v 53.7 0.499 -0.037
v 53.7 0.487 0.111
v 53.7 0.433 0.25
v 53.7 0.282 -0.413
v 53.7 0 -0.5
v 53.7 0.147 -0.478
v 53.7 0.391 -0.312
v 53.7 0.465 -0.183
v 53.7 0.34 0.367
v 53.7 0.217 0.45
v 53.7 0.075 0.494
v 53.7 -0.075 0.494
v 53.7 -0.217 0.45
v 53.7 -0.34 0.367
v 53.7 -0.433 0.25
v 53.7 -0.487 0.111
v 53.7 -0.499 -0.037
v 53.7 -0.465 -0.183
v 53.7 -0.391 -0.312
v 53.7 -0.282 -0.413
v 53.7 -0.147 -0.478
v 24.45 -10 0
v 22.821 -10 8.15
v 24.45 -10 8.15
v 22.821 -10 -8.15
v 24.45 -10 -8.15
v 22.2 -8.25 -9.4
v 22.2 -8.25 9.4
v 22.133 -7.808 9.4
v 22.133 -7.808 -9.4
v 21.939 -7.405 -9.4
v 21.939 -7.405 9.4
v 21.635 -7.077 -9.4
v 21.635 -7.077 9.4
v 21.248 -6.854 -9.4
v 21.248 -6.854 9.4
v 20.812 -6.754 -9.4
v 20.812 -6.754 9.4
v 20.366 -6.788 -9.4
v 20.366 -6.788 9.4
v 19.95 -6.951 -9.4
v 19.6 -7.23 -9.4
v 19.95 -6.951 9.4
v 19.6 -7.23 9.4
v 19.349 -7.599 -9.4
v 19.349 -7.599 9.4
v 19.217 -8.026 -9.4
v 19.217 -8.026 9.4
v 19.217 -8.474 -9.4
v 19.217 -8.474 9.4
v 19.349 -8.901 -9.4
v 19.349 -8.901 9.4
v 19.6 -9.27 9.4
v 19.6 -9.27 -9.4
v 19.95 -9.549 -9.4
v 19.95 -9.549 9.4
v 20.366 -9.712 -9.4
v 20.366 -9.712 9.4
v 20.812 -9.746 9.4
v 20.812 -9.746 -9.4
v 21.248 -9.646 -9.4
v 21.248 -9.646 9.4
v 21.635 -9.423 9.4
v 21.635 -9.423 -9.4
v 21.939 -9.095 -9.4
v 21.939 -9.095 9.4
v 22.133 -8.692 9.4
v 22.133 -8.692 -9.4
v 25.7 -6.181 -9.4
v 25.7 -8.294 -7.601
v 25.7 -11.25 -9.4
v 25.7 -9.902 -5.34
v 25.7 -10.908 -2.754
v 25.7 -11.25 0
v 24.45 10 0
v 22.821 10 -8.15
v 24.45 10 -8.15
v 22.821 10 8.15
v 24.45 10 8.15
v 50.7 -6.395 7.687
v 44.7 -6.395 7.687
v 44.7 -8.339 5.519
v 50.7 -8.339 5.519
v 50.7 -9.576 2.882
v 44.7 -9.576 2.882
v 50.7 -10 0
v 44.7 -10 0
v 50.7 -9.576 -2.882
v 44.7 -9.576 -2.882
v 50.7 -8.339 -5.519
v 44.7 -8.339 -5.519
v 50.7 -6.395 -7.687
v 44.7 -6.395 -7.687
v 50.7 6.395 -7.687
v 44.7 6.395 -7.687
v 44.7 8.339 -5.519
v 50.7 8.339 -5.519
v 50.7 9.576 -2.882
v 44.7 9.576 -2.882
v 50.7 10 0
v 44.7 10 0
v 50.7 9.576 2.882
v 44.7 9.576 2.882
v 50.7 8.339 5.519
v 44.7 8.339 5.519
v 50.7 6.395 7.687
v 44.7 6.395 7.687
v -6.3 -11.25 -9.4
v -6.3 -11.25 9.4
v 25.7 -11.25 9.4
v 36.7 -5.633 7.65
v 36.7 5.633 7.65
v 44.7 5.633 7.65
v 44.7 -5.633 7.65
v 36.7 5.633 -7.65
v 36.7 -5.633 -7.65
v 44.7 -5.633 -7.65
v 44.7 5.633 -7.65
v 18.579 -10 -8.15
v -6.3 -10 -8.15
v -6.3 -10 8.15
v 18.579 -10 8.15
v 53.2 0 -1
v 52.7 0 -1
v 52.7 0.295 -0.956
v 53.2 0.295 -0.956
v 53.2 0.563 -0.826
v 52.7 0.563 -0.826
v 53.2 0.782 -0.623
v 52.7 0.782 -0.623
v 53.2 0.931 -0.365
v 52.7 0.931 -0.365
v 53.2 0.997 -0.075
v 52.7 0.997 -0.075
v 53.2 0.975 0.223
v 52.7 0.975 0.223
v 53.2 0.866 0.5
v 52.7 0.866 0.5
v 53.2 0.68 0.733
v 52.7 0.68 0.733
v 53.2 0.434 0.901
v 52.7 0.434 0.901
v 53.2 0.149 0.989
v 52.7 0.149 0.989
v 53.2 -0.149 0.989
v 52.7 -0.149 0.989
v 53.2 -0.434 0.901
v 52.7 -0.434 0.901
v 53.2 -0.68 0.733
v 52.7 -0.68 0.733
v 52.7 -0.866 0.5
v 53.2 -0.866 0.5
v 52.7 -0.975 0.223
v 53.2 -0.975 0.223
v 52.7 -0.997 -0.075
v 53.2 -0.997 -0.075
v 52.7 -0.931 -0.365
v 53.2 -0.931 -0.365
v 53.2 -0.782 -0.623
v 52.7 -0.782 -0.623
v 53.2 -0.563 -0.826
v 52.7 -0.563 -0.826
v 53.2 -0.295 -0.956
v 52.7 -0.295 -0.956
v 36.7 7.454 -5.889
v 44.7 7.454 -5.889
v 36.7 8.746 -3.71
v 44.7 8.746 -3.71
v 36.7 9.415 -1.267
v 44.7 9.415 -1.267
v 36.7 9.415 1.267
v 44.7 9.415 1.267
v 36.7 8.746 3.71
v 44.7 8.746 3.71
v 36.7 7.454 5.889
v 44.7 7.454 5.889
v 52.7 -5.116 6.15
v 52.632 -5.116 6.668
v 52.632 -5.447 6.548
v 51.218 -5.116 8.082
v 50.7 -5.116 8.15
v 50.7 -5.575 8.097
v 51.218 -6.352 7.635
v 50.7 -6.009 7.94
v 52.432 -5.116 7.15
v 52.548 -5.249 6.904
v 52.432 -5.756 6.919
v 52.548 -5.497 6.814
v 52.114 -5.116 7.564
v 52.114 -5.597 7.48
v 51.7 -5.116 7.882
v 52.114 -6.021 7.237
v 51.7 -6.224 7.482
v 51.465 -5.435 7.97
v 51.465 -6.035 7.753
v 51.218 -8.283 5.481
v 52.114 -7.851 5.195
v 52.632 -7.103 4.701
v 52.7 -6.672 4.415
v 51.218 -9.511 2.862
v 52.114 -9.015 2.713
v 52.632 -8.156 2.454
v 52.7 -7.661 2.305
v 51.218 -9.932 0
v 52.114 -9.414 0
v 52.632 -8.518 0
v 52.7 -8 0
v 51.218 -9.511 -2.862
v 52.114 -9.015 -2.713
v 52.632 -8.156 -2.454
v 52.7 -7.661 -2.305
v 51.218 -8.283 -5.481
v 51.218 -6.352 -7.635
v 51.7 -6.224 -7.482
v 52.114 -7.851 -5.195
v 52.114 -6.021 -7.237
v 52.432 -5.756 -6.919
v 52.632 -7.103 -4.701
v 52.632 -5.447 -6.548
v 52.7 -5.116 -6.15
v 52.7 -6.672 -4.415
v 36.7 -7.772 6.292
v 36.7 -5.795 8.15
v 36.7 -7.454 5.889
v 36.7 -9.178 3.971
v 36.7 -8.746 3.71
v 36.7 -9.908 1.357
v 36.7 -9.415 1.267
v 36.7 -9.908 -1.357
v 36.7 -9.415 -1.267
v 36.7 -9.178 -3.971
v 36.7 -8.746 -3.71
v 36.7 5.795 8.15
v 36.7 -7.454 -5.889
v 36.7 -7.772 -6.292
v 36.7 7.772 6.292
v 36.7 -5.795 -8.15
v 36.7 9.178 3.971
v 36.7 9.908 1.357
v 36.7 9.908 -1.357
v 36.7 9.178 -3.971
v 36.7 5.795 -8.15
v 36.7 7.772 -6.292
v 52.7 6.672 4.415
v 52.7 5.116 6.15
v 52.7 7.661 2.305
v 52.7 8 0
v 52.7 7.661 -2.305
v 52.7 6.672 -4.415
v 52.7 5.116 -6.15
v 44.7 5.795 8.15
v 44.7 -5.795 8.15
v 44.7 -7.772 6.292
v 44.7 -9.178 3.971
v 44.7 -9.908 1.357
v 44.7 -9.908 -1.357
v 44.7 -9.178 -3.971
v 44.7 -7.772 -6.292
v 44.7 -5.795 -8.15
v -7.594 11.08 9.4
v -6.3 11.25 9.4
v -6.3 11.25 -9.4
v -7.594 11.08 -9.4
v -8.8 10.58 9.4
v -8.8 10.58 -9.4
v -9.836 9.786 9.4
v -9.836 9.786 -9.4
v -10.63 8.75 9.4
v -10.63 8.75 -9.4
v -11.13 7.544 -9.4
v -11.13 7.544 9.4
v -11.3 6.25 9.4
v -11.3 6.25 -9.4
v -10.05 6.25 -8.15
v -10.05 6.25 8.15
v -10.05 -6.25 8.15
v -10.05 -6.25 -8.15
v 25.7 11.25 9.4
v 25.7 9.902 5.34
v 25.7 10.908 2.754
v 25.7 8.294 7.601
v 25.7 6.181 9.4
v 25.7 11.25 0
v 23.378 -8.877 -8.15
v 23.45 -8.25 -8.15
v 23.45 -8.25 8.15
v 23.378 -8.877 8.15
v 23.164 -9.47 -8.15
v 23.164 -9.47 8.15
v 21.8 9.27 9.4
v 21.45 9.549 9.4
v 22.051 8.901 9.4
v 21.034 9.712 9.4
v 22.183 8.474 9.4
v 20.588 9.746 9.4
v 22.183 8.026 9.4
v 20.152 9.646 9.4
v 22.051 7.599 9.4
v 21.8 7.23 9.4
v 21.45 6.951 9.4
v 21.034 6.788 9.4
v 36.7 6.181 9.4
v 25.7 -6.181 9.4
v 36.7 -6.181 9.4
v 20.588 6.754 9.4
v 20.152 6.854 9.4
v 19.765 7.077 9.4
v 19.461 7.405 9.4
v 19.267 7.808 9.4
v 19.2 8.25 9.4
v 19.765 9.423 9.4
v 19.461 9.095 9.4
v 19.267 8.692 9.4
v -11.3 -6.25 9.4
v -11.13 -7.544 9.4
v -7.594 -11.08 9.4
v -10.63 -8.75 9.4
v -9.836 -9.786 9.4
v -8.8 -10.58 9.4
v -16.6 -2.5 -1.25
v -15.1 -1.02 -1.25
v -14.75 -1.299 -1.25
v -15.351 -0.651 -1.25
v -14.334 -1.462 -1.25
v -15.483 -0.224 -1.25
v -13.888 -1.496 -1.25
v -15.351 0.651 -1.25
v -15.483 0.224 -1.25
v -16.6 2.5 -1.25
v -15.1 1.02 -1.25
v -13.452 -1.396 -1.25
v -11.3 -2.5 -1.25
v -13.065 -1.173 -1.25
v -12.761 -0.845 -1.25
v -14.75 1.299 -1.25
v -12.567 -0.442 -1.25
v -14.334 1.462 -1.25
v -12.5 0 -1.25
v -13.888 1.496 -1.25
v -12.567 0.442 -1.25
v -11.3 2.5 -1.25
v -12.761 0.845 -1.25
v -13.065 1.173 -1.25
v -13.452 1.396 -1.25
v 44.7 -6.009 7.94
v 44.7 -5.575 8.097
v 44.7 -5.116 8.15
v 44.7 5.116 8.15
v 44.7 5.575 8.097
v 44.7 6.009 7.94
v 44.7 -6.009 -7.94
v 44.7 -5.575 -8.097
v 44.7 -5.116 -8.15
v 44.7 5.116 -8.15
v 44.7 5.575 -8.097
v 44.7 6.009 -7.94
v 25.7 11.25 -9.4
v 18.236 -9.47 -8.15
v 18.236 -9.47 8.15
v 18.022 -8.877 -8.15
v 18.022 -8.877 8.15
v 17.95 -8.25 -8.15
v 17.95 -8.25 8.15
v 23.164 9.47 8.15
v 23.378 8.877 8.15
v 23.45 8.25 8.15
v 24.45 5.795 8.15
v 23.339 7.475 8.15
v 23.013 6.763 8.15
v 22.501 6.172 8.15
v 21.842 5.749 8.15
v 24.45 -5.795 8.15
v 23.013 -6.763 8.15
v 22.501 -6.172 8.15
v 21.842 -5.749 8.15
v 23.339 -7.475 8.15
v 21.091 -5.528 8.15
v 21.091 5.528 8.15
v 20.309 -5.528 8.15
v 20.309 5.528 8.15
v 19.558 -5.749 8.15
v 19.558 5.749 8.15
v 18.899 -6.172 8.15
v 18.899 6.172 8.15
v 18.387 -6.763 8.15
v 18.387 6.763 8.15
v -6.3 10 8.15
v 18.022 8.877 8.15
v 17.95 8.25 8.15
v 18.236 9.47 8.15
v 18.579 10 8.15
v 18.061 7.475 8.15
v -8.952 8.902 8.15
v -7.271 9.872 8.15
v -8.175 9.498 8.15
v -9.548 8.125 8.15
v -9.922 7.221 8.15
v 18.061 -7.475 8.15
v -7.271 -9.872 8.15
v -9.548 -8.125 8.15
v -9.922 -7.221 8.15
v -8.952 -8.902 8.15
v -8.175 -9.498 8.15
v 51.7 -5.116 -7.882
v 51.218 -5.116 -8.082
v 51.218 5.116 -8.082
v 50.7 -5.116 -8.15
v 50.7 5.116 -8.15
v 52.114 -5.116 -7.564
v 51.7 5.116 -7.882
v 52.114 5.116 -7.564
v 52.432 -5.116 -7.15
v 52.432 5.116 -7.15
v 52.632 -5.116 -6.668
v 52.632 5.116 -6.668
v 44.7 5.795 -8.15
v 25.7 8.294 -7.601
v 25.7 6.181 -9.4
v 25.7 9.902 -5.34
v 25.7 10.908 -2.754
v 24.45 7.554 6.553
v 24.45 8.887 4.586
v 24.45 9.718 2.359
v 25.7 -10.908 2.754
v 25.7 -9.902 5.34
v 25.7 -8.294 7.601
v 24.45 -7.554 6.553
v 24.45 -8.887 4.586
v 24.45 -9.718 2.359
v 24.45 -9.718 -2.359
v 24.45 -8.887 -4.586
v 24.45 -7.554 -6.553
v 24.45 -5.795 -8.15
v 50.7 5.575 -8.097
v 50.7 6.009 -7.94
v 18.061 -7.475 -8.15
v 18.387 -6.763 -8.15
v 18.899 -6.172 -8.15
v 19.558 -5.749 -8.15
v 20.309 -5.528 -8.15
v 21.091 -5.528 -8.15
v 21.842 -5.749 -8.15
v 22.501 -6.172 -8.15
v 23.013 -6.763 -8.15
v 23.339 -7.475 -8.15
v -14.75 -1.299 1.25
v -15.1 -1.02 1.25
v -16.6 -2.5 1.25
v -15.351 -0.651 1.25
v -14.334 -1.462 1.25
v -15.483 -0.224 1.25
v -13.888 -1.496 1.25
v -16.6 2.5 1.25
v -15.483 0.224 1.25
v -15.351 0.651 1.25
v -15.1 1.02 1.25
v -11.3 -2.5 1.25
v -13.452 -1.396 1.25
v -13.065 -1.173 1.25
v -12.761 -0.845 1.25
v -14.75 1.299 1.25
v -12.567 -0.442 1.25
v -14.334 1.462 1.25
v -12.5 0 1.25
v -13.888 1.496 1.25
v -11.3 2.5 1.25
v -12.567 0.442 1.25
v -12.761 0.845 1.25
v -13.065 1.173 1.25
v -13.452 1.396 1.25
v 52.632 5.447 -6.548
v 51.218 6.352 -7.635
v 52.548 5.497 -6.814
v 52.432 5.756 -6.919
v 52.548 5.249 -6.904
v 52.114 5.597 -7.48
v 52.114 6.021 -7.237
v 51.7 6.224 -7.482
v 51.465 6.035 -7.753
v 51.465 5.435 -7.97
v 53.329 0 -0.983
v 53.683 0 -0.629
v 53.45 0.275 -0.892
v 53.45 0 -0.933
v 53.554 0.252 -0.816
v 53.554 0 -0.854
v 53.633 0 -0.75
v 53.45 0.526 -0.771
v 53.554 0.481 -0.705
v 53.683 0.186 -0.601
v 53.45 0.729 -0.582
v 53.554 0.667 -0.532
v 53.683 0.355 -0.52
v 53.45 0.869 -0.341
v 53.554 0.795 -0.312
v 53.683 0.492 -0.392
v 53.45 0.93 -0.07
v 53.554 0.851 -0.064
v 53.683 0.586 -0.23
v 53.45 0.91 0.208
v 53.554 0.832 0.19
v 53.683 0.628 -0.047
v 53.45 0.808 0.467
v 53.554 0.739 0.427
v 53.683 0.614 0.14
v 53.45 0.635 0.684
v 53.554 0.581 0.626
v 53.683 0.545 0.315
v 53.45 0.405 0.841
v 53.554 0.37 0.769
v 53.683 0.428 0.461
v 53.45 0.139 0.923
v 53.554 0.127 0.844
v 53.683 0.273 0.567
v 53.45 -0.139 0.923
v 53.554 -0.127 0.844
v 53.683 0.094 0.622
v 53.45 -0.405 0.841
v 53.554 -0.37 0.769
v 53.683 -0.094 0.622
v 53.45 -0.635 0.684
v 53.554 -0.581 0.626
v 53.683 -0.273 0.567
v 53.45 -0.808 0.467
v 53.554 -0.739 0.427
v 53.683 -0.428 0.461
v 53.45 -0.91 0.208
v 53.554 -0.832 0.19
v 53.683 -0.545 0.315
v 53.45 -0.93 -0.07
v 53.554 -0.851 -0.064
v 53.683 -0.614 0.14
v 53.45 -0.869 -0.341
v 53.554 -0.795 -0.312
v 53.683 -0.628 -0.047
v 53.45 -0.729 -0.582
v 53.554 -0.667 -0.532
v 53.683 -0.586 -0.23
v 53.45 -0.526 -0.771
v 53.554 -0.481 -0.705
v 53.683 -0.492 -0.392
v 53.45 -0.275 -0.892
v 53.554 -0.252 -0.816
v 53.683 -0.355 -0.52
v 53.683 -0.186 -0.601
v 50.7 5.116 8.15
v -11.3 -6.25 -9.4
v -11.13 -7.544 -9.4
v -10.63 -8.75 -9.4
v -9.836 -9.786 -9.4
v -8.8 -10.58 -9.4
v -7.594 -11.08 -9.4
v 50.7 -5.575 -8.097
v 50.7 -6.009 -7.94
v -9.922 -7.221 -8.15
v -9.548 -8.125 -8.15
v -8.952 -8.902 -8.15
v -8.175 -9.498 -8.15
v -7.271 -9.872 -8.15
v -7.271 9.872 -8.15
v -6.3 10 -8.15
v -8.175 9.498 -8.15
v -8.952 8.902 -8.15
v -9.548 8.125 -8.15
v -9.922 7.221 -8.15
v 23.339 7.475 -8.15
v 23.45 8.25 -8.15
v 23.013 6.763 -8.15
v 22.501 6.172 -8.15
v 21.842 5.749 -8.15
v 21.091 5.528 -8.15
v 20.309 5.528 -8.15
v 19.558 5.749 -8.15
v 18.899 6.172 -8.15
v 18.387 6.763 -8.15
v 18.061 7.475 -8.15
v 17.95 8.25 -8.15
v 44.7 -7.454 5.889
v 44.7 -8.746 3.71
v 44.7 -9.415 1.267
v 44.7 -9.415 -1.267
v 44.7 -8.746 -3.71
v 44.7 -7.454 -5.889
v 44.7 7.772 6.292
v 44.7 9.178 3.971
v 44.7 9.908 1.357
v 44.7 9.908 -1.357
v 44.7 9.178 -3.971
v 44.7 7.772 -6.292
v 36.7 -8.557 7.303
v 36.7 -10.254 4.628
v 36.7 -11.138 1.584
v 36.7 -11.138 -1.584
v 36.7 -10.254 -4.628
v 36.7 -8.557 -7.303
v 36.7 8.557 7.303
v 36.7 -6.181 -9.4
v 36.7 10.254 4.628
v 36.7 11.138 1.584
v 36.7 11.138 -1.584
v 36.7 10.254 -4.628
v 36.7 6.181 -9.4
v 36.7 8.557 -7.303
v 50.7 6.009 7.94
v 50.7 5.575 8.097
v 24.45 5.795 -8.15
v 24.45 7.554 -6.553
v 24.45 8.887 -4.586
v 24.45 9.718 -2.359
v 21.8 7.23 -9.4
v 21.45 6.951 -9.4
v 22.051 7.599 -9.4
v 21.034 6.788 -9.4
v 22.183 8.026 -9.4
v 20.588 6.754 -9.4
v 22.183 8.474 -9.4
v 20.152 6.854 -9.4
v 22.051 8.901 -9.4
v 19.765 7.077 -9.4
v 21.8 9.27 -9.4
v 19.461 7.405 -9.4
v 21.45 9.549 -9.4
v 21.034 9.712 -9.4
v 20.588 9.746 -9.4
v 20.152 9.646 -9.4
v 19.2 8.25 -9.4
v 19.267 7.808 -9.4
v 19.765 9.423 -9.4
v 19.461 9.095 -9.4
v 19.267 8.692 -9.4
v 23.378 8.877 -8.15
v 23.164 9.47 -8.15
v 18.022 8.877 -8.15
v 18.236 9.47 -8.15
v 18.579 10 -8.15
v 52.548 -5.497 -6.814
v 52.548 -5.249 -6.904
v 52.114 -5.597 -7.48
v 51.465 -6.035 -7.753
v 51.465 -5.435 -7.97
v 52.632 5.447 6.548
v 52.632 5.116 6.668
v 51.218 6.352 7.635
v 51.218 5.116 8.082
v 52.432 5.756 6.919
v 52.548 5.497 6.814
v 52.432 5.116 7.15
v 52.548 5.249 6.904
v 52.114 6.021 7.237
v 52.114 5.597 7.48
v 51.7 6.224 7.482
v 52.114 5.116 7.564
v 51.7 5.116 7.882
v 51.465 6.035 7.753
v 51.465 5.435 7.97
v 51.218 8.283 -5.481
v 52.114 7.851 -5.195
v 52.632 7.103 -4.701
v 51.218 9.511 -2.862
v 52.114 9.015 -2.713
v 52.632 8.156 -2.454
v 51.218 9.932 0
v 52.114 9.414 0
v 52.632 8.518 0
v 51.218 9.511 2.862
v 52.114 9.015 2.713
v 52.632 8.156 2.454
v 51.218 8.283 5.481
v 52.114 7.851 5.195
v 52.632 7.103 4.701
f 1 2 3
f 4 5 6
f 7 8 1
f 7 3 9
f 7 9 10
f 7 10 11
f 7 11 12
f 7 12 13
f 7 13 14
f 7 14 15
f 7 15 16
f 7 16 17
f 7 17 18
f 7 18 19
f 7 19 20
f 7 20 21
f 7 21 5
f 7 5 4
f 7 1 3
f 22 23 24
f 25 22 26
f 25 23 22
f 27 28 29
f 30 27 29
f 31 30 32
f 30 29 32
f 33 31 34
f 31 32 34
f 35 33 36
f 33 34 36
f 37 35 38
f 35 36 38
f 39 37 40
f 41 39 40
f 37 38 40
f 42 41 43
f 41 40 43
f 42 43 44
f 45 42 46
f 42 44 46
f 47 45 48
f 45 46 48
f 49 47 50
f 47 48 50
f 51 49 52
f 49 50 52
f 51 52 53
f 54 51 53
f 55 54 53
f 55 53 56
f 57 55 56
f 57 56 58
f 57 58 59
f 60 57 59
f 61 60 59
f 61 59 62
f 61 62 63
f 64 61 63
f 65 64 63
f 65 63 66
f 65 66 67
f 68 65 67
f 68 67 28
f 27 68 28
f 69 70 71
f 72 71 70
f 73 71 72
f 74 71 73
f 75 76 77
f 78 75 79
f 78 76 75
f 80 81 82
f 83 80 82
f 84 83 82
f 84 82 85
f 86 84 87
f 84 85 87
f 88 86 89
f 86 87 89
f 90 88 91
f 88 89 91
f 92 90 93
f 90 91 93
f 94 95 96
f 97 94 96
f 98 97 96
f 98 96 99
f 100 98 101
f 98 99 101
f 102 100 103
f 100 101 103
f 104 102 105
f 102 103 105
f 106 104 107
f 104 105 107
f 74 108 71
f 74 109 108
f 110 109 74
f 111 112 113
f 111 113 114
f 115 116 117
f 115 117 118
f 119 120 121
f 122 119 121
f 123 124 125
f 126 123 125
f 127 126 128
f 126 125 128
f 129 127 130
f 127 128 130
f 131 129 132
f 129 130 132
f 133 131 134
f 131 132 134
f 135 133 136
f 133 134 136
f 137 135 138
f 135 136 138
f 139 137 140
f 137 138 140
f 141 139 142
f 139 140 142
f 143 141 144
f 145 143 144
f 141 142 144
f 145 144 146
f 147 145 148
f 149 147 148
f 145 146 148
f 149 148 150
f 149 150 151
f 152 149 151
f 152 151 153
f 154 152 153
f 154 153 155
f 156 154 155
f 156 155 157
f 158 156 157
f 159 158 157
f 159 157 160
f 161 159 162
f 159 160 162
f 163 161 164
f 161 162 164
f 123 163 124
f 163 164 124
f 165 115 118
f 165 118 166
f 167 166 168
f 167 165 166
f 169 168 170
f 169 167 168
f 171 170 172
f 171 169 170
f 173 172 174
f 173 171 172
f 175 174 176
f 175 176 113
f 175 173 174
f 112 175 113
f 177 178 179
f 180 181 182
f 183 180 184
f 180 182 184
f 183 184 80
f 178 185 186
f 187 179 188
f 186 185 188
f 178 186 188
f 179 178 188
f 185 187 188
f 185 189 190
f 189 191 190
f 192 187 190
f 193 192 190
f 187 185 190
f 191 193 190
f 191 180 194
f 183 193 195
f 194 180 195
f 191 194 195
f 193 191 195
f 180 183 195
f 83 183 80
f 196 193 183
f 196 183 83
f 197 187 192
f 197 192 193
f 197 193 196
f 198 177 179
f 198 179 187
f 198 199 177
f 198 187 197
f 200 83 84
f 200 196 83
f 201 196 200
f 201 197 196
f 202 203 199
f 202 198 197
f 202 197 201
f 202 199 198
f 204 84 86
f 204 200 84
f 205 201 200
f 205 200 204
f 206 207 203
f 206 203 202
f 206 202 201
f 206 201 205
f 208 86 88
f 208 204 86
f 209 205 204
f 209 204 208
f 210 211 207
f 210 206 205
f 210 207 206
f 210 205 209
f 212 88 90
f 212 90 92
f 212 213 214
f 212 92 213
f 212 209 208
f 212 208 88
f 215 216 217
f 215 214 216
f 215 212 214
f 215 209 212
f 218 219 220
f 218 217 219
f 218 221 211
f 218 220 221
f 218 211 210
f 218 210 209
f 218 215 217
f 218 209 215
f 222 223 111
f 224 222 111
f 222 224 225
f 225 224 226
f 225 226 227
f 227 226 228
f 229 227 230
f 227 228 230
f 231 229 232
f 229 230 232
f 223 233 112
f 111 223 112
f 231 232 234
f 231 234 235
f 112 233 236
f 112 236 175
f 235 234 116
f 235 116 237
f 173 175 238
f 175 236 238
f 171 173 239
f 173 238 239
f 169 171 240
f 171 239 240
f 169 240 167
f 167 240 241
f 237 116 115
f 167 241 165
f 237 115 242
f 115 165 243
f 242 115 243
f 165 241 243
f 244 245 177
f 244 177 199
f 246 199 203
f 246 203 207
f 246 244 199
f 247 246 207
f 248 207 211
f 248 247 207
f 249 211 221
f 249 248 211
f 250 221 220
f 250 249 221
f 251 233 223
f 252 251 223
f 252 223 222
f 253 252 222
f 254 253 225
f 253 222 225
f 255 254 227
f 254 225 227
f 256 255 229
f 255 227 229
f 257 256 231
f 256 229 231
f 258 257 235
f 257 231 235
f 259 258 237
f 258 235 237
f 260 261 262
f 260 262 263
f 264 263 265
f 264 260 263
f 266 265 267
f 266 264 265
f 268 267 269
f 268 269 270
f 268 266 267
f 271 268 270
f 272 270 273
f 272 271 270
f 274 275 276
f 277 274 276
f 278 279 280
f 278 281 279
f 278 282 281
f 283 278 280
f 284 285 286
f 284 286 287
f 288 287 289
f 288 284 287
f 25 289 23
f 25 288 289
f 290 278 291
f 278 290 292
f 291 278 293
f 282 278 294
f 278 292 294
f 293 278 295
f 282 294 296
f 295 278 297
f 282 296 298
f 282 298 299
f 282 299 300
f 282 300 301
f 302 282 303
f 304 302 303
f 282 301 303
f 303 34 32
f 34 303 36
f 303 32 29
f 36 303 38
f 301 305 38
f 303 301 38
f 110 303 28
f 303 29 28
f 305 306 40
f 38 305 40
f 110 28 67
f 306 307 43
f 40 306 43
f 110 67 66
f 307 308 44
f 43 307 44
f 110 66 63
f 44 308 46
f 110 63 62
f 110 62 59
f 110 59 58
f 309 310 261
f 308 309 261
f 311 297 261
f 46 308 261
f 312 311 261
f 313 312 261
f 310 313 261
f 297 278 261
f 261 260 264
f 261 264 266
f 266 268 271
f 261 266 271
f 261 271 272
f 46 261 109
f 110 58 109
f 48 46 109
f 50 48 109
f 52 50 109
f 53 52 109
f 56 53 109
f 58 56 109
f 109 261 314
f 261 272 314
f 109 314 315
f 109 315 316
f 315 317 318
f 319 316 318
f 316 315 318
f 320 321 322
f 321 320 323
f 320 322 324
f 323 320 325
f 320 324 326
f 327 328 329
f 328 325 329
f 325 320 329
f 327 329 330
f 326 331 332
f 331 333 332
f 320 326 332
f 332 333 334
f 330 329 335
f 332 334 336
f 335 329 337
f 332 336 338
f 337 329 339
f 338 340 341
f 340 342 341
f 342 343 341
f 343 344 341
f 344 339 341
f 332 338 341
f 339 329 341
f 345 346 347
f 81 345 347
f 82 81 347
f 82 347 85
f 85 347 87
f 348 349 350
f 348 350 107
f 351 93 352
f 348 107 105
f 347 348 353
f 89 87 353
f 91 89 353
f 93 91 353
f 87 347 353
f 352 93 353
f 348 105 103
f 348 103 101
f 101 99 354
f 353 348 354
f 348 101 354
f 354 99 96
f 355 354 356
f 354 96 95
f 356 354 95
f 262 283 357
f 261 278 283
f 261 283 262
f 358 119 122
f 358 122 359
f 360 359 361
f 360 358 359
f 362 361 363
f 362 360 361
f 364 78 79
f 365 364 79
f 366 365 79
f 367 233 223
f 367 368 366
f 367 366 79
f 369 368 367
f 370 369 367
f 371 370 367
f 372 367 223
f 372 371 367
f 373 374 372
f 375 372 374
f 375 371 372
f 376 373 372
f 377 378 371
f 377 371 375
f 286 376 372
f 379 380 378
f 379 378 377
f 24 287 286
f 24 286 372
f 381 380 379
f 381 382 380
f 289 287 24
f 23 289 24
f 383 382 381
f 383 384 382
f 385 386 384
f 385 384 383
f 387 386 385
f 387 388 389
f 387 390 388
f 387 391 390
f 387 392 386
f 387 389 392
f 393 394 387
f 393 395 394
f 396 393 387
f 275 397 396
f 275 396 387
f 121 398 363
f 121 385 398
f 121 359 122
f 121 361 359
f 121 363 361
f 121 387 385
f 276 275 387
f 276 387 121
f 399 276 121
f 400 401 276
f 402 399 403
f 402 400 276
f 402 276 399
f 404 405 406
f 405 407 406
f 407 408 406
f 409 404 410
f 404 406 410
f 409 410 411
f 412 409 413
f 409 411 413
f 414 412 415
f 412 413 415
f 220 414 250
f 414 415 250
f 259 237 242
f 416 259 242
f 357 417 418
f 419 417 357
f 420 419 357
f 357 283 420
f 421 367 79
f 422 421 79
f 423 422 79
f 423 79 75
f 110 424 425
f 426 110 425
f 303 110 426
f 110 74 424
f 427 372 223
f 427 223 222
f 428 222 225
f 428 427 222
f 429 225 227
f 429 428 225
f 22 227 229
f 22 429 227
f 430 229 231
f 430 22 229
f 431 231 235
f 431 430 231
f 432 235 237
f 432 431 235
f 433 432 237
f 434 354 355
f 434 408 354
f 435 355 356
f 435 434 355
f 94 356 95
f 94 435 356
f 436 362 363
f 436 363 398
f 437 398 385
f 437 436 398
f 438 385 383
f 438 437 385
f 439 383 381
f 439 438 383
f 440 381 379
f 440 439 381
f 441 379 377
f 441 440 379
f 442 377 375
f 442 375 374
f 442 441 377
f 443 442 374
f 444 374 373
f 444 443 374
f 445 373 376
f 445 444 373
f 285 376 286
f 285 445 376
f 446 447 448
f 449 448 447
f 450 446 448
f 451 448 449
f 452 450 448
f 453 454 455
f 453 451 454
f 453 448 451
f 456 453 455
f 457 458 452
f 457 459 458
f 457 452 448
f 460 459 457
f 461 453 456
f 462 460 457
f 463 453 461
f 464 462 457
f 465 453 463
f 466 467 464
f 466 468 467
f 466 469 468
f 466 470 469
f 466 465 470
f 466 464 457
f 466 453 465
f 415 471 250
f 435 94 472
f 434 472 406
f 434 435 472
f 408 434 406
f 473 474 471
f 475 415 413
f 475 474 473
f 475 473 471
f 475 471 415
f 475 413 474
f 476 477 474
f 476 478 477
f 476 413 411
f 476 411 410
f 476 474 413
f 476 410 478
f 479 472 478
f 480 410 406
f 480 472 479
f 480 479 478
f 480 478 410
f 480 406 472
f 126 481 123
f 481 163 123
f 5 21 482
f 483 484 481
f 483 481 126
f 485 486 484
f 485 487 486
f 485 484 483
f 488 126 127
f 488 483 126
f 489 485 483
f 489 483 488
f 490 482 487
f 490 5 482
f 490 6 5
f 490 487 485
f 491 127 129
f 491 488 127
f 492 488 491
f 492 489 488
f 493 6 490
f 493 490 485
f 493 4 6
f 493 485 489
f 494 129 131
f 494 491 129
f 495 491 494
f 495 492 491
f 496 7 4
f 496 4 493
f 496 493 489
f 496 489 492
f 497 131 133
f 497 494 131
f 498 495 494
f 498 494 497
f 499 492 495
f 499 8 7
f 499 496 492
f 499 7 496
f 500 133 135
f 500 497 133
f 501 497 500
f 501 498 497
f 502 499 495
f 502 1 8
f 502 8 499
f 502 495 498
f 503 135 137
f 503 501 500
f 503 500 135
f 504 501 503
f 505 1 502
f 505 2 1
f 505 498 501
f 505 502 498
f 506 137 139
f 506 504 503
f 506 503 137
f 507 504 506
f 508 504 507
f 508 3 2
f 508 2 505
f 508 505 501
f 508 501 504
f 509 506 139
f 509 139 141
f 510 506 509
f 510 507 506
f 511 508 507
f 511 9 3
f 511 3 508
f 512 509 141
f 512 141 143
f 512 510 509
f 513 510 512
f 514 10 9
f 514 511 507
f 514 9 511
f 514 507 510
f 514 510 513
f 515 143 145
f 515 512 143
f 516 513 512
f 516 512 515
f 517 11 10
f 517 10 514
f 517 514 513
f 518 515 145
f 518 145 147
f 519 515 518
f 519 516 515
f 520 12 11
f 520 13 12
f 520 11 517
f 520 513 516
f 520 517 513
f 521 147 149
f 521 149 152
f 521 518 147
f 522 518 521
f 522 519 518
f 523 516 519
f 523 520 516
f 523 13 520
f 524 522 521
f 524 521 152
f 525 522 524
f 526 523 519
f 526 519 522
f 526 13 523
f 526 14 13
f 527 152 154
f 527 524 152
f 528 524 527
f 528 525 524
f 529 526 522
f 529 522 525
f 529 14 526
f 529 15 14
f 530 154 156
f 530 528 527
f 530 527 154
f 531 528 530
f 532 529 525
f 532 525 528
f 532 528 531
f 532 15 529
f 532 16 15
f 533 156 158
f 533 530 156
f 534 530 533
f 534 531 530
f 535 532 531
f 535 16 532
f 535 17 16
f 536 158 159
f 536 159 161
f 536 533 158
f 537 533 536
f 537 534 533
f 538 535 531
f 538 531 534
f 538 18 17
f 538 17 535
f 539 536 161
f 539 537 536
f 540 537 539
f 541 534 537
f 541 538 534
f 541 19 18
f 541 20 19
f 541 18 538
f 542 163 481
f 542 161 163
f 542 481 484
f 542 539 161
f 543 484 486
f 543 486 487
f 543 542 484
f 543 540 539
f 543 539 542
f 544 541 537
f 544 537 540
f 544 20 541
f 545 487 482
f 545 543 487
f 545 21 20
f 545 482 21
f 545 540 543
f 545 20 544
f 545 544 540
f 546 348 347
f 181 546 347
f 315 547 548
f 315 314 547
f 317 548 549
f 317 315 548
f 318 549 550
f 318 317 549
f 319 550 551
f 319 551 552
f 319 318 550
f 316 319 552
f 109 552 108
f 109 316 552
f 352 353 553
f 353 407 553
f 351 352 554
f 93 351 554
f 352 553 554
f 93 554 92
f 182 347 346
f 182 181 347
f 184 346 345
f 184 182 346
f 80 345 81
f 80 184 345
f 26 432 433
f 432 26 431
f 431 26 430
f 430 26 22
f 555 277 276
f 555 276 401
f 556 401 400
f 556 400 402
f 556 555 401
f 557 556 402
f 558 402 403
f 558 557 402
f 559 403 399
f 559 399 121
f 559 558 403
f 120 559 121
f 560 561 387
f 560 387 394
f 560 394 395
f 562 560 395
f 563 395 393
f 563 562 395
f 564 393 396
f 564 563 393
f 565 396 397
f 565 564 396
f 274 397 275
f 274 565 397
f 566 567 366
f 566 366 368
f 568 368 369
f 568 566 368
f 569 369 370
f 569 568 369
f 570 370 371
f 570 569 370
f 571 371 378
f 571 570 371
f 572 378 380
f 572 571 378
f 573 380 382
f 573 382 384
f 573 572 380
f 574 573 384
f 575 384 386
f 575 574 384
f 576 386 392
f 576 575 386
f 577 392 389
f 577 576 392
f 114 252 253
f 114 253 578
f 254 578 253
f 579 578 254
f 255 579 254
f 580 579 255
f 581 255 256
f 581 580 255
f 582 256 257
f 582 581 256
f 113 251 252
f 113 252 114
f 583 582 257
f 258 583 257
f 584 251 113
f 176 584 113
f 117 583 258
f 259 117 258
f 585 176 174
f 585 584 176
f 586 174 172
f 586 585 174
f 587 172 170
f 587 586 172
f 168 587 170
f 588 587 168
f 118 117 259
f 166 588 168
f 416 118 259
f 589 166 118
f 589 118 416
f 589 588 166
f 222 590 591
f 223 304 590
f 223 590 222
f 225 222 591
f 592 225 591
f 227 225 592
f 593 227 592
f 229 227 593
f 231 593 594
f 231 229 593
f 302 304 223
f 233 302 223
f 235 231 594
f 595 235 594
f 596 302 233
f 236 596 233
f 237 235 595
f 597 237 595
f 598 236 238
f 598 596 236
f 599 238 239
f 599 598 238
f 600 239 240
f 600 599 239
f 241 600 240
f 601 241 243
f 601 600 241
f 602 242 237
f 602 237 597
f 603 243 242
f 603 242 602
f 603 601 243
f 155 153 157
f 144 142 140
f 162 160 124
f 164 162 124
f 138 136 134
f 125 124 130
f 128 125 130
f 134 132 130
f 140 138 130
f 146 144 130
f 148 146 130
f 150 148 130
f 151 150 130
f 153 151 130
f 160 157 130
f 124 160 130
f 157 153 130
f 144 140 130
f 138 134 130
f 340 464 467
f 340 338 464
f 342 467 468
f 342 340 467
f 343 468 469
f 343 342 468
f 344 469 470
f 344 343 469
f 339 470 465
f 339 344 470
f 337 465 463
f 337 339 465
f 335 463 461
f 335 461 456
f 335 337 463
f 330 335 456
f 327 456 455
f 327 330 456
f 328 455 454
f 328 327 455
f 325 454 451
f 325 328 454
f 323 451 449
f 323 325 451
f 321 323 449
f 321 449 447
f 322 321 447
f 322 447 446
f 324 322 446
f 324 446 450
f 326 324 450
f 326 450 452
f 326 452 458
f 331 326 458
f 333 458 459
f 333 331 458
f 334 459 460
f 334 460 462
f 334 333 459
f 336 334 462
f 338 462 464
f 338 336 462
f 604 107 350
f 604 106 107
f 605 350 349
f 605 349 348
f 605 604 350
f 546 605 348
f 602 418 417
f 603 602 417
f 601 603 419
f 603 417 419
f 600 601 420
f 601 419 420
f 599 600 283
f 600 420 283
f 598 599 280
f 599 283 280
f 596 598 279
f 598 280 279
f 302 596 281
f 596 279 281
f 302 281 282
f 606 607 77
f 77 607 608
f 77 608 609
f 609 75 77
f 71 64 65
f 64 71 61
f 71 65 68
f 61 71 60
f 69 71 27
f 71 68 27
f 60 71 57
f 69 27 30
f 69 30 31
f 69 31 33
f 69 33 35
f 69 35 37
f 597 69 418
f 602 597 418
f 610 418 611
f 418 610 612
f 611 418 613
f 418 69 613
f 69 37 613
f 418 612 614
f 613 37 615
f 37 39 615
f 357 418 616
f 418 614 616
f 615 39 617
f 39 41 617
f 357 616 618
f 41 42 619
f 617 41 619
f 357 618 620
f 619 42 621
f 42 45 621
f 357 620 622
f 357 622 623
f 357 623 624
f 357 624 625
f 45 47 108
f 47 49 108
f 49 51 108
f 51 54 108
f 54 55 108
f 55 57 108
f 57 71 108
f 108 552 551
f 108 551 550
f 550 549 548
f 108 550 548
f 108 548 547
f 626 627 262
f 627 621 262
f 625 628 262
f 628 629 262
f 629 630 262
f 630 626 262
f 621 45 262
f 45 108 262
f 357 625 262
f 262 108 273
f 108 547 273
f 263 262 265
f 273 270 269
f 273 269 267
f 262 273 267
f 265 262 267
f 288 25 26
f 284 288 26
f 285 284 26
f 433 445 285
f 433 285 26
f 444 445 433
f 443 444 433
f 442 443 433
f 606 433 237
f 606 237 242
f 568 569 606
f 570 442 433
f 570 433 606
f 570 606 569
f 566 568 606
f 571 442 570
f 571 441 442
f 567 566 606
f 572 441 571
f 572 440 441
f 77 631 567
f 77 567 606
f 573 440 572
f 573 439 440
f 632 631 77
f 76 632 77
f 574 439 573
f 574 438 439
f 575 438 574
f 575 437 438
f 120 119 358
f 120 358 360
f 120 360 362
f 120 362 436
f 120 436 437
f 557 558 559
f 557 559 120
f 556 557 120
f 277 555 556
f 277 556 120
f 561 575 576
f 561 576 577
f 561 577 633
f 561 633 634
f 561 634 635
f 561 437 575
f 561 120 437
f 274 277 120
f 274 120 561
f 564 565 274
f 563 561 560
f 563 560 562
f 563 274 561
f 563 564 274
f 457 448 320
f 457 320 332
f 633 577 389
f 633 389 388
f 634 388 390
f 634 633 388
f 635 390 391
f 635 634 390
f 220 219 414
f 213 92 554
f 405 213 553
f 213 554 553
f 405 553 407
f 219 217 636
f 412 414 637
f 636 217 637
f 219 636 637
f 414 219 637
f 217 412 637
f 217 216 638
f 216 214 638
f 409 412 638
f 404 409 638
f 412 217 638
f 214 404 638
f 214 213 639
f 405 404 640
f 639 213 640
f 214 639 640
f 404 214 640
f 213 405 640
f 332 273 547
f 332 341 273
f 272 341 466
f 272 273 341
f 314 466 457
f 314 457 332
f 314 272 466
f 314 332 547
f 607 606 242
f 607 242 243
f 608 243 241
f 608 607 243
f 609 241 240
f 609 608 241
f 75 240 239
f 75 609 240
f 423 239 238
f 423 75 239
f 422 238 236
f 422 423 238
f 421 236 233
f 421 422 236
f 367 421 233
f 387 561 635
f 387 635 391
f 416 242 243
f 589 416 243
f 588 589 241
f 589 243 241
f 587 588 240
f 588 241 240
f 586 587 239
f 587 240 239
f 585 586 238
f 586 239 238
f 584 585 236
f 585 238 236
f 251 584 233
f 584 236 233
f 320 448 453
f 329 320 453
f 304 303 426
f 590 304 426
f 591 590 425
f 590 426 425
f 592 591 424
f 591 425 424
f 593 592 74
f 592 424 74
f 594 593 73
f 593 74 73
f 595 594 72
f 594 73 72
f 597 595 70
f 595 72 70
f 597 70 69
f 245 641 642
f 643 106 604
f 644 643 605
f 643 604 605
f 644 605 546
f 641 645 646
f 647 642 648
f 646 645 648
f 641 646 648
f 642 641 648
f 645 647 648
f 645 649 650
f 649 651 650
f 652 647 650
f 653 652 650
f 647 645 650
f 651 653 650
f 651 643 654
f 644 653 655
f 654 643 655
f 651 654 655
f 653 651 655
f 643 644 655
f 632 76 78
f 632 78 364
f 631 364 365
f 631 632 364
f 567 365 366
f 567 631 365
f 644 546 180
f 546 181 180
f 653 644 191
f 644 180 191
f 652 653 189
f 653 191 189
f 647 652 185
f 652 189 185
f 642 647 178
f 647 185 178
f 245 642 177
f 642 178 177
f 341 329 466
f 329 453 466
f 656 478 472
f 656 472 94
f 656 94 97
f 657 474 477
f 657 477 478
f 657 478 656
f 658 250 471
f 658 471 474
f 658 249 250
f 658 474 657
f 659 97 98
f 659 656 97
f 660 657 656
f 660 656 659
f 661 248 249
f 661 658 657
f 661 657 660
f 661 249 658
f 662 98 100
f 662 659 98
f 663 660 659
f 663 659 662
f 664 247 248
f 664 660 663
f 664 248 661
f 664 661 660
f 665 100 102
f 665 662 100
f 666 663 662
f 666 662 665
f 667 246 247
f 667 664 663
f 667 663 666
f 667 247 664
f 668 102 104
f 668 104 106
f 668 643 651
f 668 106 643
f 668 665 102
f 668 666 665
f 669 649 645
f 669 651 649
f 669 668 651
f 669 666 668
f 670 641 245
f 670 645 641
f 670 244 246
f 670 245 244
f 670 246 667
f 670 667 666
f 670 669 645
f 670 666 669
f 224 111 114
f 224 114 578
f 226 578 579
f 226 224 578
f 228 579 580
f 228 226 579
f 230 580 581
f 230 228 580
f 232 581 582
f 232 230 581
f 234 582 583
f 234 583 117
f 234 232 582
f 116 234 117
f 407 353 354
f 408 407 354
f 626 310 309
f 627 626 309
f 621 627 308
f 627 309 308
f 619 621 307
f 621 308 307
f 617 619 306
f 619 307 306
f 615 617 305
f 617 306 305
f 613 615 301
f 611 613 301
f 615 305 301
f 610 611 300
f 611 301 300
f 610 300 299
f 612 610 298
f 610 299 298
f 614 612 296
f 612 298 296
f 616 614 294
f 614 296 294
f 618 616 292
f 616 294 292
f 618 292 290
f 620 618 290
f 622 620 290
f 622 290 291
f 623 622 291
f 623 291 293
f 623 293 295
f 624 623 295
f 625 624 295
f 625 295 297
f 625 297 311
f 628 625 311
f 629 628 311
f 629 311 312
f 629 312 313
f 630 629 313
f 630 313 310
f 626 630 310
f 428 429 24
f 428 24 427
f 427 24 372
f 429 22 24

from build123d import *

# Parameters (mm, degrees)
YELLOW_BODY_DEPTH  = 9.4
SKETCH8_W          = 5.3
SKETCH8_H          = 5
SKETCH8_R          = 1.5
LUG_DEPTH          = 1.25
HOLES_REACH        = 35.771
SKETCH9_R          = 1.5
MOTOR_SOCKET_DEPTH = 11
SHELL1_START       = -6.3
SHELL1_OUTLINE_W   = 20
SHELL1_OUTLINE_H   = 16.3
SHELL1_DEPTH       = 24.25
SHELL1_START_2     = 23.45
SHELL1_2_DEPTH     = 13.25
SHELL1_3_DEPTH     = 1
SHELL1_START_3     = -8.15
SHELL1_4_DEPTH     = 16.3
MOTOR_BODY_DEPTH   = 8
MOTOR_END_DEPTH    = 8
FILLET1_R          = 2
SKETCH5_R          = 1
MOTOR_SHAFT_DEPTH  = 1
FILLET2_R          = 0.5


with BuildPart() as part:
    # Sketch1 → Yellow Body (new, symmetric)
    with BuildSketch(Plane.XY):
        with BuildLine():
            Line((-6.3, -11.25), (25.7, -11.25))
            Line((25.7, -11.25), (25.7, 11.25))
            Line((25.7, 11.25), (-6.3, 11.25))
            ThreePointArc((-6.3, 11.25), (-9.835534, 9.785534), (-11.3, 6.25))
            Line((-11.3, 6.25), (-11.3, -6.25))
            ThreePointArc((-11.3, -6.25), (-9.835534, -9.785534), (-6.3, -11.25))
        make_face()
    extrude(amount=YELLOW_BODY_DEPTH, both=True)

    # Sketch8 → Lug (add, symmetric)
    with BuildSketch(Plane.XY):
        with Locations((-13.95, 0)):
            Rectangle(SKETCH8_W, SKETCH8_H)
        with Locations((-14, 0)):
            Circle(SKETCH8_R, mode=Mode.SUBTRACT)
    extrude(amount=LUG_DEPTH, both=True)

    # Sketch9 → Holes (cut, up to next)
    with BuildSketch(Plane.XY.offset(9.4), mode=Mode.PRIVATE) as holes_sk1:
        with Locations((20.7, -8.25)):
            Circle(SKETCH9_R)
    holes_tool1 = extrude(holes_sk1.sketch, amount=-HOLES_REACH, mode=Mode.PRIVATE) & part.part
    # Sketch9 → Holes (cut, up to next)
    with BuildSketch(Plane.XY.offset(9.4), mode=Mode.PRIVATE) as holes_sk2:
        with Locations(Location((20.7, 8.25, 0), (0, 0, 180))):
            Circle(SKETCH9_R)
    holes_tool2 = extrude(holes_sk2.sketch, amount=-HOLES_REACH, mode=Mode.PRIVATE) & part.part
    add(holes_tool1.solids().sort_by_distance((20.7, -8.25, 9.4))[0], mode=Mode.SUBTRACT)
    add(holes_tool2.solids().sort_by_distance((20.7, 8.25, 9.4))[0], mode=Mode.SUBTRACT)

    # Sketch2 → Motor Socket (add)
    with BuildSketch(Plane(origin=(25.7, 0, 0), x_dir=(0, 0, -1), z_dir=(1, 0, 0))):
        with BuildLine():
            Line((9.4, -6.180817), (9.4, 6.180817))
            ThreePointArc((9.4, 6.180817), (0, 11.25), (-9.4, 6.180817))
            Line((-9.4, 6.180817), (-9.4, -6.180817))
            ThreePointArc((-9.4, -6.180817), (0, -11.25), (9.4, -6.180817))
        make_face()
    extrude(amount=MOTOR_SOCKET_DEPTH)

    # Shell1: read off the stored shape, not the designer's step
    # Shell1 outline → Shell1 (cut)
    with BuildSketch(Plane.YZ.offset(SHELL1_START)):
        Rectangle(SHELL1_OUTLINE_W, SHELL1_OUTLINE_H)
    extrude(amount=SHELL1_DEPTH, mode=Mode.SUBTRACT)

    # Shell1 2 outline → Shell1 2 (cut)
    with BuildSketch(Plane.YZ.offset(SHELL1_START_2)):
        with BuildLine():
            ThreePointArc((-5.79461, 8.15), (-10, 0), (-5.79461, -8.15))
            Line((-5.79461, -8.15), (5.79461, -8.15))
            ThreePointArc((5.79461, -8.15), (10, 0), (5.79461, 8.15))
            Line((5.79461, 8.15), (-5.79461, 8.15))
        make_face()
    extrude(amount=SHELL1_2_DEPTH, mode=Mode.SUBTRACT)

    # Shell1 3 outline → Shell1 3 (cut)
    with BuildSketch(Plane.YZ.offset(SHELL1_START_2)):
        with BuildLine():
            Line((-10, 0), (-10, -8.15))
            Line((-10, -8.15), (-5.79461, -8.15))
            ThreePointArc((-5.79461, -8.15), (-8.886678, -4.585515), (-10, 0))
        make_face()
        with BuildLine():
            Line((-10, 8.15), (-10, 0))
            ThreePointArc((-10, 0), (-8.886678, 4.585515), (-5.79461, 8.15))
            Line((-5.79461, 8.15), (-10, 8.15))
        make_face()
        with BuildLine():
            ThreePointArc((10, 0), (8.886678, -4.585515), (5.79461, -8.15))
            Line((5.79461, -8.15), (10, -8.15))
            Line((10, -8.15), (10, 0))
        make_face()
        with BuildLine():
            Line((10, 8.15), (5.79461, 8.15))
            ThreePointArc((5.79461, 8.15), (8.886678, 4.585515), (10, 0))
            Line((10, 0), (10, 8.15))
        make_face()
    extrude(amount=SHELL1_3_DEPTH, mode=Mode.SUBTRACT)

    # Shell1 4 outline → Shell1 4 (cut)
    with BuildSketch(Plane.XY.offset(SHELL1_START_3)):
        with BuildLine():
            ThreePointArc((22.82132, 10), (23.288062, 9.17975), (23.45, 8.25))
            Line((23.45, 8.25), (23.45, 10))
            Line((23.45, 10), (22.82132, 10))
        make_face()
        with BuildLine():
            ThreePointArc((17.95, -8.25), (20.7, -5.5), (23.45, -8.25))
            Line((23.45, -8.25), (23.45, 8.25))
            ThreePointArc((23.45, 8.25), (20.7, 5.5), (17.95, 8.25))
            Line((17.95, 8.25), (17.95, -8.25))
        make_face()
        with BuildLine():
            Line((22.82132, -10), (23.45, -10))
            Line((23.45, -10), (23.45, -8.25))
            ThreePointArc((23.45, -8.25), (23.288062, -9.17975), (22.82132, -10))
        make_face()
        with BuildLine():
            ThreePointArc((18.57868, -10), (18.111938, -9.17975), (17.95, -8.25))
            Line((17.95, -8.25), (17.95, -10))
            Line((17.95, -10), (18.57868, -10))
        make_face()
        with BuildLine():
            Line((17.95, 10), (17.95, 8.25))
            ThreePointArc((17.95, 8.25), (18.111938, 9.17975), (18.57868, 10))
            Line((18.57868, 10), (17.95, 10))
        make_face()
        with BuildLine():
            ThreePointArc((-10.05, -6.25), (-8.95165, -8.90165), (-6.3, -10))
            Line((-6.3, -10), (-6.3, 10))
            ThreePointArc((-6.3, 10), (-8.95165, 8.90165), (-10.05, 6.25))
            Line((-10.05, 6.25), (-10.05, -6.25))
        make_face()
    extrude(amount=SHELL1_4_DEPTH, mode=Mode.SUBTRACT)


with BuildPart() as body_2:
    # Sketch3 → Motor Body (new body)
    with BuildSketch(Plane(origin=(36.7, 0, 0), x_dir=(0, 0, -1), z_dir=(1, 0, 0))):
        with BuildLine():
            Line((-8.15, 5.79461), (-8.15, -5.79461))
            ThreePointArc((-8.15, -5.79461), (0, -10), (8.15, -5.79461))
            Line((8.15, -5.79461), (8.15, 5.79461))
            ThreePointArc((8.15, 5.79461), (0, 10), (-8.15, 5.79461))
        make_face()
        with BuildLine():
            Line((-7.65, 5.632717), (-7.65, -5.632717))
            ThreePointArc((-7.65, -5.632717), (0, -9.5), (7.65, -5.632717))
            Line((7.65, -5.632717), (7.65, 5.632717))
            ThreePointArc((7.65, 5.632717), (0, 9.5), (-7.65, 5.632717))
        make_face(mode=Mode.SUBTRACT)
    extrude(amount=MOTOR_BODY_DEPTH)


with BuildPart() as body_3:
    # Sketch4 → Motor End (new body)
    with BuildSketch(Plane(origin=(44.7, 0, 0), x_dir=(0, 0, -1), z_dir=(1, 0, 0))):
        with BuildLine():
            Line((8.15, -5.79461), (8.15, 5.79461))
            ThreePointArc((8.15, 5.79461), (0, 10), (-8.15, 5.79461))
            Line((-8.15, 5.79461), (-8.15, -5.79461))
            ThreePointArc((-8.15, -5.79461), (0, -10), (8.15, -5.79461))
        make_face()
    extrude(amount=MOTOR_END_DEPTH)

    # Fillet1
    fillet1_edges = [body_3.edges().sort_by_distance(p)[0] for p in [
        (52.7, 10, 0),
        (52.7, 0, 8.15),
        (52.7, -10, 0),
        (52.7, 0, -8.15),
        (48.7, -5.79461, 8.15),
        (48.7, 5.79461, 8.15),
        (48.7, 5.79461, -8.15),
        (48.7, -5.79461, -8.15),
    ]]
    fillet(fillet1_edges, radius=FILLET1_R)


with BuildPart() as body_4:
    # Sketch5 → Motor Shaft (new body)
    with BuildSketch(Plane(origin=(52.7, 0, 0), x_dir=(0, 0, -1), z_dir=(1, 0, 0))):
        Circle(SKETCH5_R)
    extrude(amount=MOTOR_SHAFT_DEPTH)

    # Fillet2
    fillet2_edges = [body_4.edges().sort_by_distance(p)[0] for p in [
        (53.7, 0, 1),
    ]]
    fillet(fillet2_edges, radius=FILLET2_R)


solid = Compound([part.part, body_2.part, body_3.part, body_4.part])
